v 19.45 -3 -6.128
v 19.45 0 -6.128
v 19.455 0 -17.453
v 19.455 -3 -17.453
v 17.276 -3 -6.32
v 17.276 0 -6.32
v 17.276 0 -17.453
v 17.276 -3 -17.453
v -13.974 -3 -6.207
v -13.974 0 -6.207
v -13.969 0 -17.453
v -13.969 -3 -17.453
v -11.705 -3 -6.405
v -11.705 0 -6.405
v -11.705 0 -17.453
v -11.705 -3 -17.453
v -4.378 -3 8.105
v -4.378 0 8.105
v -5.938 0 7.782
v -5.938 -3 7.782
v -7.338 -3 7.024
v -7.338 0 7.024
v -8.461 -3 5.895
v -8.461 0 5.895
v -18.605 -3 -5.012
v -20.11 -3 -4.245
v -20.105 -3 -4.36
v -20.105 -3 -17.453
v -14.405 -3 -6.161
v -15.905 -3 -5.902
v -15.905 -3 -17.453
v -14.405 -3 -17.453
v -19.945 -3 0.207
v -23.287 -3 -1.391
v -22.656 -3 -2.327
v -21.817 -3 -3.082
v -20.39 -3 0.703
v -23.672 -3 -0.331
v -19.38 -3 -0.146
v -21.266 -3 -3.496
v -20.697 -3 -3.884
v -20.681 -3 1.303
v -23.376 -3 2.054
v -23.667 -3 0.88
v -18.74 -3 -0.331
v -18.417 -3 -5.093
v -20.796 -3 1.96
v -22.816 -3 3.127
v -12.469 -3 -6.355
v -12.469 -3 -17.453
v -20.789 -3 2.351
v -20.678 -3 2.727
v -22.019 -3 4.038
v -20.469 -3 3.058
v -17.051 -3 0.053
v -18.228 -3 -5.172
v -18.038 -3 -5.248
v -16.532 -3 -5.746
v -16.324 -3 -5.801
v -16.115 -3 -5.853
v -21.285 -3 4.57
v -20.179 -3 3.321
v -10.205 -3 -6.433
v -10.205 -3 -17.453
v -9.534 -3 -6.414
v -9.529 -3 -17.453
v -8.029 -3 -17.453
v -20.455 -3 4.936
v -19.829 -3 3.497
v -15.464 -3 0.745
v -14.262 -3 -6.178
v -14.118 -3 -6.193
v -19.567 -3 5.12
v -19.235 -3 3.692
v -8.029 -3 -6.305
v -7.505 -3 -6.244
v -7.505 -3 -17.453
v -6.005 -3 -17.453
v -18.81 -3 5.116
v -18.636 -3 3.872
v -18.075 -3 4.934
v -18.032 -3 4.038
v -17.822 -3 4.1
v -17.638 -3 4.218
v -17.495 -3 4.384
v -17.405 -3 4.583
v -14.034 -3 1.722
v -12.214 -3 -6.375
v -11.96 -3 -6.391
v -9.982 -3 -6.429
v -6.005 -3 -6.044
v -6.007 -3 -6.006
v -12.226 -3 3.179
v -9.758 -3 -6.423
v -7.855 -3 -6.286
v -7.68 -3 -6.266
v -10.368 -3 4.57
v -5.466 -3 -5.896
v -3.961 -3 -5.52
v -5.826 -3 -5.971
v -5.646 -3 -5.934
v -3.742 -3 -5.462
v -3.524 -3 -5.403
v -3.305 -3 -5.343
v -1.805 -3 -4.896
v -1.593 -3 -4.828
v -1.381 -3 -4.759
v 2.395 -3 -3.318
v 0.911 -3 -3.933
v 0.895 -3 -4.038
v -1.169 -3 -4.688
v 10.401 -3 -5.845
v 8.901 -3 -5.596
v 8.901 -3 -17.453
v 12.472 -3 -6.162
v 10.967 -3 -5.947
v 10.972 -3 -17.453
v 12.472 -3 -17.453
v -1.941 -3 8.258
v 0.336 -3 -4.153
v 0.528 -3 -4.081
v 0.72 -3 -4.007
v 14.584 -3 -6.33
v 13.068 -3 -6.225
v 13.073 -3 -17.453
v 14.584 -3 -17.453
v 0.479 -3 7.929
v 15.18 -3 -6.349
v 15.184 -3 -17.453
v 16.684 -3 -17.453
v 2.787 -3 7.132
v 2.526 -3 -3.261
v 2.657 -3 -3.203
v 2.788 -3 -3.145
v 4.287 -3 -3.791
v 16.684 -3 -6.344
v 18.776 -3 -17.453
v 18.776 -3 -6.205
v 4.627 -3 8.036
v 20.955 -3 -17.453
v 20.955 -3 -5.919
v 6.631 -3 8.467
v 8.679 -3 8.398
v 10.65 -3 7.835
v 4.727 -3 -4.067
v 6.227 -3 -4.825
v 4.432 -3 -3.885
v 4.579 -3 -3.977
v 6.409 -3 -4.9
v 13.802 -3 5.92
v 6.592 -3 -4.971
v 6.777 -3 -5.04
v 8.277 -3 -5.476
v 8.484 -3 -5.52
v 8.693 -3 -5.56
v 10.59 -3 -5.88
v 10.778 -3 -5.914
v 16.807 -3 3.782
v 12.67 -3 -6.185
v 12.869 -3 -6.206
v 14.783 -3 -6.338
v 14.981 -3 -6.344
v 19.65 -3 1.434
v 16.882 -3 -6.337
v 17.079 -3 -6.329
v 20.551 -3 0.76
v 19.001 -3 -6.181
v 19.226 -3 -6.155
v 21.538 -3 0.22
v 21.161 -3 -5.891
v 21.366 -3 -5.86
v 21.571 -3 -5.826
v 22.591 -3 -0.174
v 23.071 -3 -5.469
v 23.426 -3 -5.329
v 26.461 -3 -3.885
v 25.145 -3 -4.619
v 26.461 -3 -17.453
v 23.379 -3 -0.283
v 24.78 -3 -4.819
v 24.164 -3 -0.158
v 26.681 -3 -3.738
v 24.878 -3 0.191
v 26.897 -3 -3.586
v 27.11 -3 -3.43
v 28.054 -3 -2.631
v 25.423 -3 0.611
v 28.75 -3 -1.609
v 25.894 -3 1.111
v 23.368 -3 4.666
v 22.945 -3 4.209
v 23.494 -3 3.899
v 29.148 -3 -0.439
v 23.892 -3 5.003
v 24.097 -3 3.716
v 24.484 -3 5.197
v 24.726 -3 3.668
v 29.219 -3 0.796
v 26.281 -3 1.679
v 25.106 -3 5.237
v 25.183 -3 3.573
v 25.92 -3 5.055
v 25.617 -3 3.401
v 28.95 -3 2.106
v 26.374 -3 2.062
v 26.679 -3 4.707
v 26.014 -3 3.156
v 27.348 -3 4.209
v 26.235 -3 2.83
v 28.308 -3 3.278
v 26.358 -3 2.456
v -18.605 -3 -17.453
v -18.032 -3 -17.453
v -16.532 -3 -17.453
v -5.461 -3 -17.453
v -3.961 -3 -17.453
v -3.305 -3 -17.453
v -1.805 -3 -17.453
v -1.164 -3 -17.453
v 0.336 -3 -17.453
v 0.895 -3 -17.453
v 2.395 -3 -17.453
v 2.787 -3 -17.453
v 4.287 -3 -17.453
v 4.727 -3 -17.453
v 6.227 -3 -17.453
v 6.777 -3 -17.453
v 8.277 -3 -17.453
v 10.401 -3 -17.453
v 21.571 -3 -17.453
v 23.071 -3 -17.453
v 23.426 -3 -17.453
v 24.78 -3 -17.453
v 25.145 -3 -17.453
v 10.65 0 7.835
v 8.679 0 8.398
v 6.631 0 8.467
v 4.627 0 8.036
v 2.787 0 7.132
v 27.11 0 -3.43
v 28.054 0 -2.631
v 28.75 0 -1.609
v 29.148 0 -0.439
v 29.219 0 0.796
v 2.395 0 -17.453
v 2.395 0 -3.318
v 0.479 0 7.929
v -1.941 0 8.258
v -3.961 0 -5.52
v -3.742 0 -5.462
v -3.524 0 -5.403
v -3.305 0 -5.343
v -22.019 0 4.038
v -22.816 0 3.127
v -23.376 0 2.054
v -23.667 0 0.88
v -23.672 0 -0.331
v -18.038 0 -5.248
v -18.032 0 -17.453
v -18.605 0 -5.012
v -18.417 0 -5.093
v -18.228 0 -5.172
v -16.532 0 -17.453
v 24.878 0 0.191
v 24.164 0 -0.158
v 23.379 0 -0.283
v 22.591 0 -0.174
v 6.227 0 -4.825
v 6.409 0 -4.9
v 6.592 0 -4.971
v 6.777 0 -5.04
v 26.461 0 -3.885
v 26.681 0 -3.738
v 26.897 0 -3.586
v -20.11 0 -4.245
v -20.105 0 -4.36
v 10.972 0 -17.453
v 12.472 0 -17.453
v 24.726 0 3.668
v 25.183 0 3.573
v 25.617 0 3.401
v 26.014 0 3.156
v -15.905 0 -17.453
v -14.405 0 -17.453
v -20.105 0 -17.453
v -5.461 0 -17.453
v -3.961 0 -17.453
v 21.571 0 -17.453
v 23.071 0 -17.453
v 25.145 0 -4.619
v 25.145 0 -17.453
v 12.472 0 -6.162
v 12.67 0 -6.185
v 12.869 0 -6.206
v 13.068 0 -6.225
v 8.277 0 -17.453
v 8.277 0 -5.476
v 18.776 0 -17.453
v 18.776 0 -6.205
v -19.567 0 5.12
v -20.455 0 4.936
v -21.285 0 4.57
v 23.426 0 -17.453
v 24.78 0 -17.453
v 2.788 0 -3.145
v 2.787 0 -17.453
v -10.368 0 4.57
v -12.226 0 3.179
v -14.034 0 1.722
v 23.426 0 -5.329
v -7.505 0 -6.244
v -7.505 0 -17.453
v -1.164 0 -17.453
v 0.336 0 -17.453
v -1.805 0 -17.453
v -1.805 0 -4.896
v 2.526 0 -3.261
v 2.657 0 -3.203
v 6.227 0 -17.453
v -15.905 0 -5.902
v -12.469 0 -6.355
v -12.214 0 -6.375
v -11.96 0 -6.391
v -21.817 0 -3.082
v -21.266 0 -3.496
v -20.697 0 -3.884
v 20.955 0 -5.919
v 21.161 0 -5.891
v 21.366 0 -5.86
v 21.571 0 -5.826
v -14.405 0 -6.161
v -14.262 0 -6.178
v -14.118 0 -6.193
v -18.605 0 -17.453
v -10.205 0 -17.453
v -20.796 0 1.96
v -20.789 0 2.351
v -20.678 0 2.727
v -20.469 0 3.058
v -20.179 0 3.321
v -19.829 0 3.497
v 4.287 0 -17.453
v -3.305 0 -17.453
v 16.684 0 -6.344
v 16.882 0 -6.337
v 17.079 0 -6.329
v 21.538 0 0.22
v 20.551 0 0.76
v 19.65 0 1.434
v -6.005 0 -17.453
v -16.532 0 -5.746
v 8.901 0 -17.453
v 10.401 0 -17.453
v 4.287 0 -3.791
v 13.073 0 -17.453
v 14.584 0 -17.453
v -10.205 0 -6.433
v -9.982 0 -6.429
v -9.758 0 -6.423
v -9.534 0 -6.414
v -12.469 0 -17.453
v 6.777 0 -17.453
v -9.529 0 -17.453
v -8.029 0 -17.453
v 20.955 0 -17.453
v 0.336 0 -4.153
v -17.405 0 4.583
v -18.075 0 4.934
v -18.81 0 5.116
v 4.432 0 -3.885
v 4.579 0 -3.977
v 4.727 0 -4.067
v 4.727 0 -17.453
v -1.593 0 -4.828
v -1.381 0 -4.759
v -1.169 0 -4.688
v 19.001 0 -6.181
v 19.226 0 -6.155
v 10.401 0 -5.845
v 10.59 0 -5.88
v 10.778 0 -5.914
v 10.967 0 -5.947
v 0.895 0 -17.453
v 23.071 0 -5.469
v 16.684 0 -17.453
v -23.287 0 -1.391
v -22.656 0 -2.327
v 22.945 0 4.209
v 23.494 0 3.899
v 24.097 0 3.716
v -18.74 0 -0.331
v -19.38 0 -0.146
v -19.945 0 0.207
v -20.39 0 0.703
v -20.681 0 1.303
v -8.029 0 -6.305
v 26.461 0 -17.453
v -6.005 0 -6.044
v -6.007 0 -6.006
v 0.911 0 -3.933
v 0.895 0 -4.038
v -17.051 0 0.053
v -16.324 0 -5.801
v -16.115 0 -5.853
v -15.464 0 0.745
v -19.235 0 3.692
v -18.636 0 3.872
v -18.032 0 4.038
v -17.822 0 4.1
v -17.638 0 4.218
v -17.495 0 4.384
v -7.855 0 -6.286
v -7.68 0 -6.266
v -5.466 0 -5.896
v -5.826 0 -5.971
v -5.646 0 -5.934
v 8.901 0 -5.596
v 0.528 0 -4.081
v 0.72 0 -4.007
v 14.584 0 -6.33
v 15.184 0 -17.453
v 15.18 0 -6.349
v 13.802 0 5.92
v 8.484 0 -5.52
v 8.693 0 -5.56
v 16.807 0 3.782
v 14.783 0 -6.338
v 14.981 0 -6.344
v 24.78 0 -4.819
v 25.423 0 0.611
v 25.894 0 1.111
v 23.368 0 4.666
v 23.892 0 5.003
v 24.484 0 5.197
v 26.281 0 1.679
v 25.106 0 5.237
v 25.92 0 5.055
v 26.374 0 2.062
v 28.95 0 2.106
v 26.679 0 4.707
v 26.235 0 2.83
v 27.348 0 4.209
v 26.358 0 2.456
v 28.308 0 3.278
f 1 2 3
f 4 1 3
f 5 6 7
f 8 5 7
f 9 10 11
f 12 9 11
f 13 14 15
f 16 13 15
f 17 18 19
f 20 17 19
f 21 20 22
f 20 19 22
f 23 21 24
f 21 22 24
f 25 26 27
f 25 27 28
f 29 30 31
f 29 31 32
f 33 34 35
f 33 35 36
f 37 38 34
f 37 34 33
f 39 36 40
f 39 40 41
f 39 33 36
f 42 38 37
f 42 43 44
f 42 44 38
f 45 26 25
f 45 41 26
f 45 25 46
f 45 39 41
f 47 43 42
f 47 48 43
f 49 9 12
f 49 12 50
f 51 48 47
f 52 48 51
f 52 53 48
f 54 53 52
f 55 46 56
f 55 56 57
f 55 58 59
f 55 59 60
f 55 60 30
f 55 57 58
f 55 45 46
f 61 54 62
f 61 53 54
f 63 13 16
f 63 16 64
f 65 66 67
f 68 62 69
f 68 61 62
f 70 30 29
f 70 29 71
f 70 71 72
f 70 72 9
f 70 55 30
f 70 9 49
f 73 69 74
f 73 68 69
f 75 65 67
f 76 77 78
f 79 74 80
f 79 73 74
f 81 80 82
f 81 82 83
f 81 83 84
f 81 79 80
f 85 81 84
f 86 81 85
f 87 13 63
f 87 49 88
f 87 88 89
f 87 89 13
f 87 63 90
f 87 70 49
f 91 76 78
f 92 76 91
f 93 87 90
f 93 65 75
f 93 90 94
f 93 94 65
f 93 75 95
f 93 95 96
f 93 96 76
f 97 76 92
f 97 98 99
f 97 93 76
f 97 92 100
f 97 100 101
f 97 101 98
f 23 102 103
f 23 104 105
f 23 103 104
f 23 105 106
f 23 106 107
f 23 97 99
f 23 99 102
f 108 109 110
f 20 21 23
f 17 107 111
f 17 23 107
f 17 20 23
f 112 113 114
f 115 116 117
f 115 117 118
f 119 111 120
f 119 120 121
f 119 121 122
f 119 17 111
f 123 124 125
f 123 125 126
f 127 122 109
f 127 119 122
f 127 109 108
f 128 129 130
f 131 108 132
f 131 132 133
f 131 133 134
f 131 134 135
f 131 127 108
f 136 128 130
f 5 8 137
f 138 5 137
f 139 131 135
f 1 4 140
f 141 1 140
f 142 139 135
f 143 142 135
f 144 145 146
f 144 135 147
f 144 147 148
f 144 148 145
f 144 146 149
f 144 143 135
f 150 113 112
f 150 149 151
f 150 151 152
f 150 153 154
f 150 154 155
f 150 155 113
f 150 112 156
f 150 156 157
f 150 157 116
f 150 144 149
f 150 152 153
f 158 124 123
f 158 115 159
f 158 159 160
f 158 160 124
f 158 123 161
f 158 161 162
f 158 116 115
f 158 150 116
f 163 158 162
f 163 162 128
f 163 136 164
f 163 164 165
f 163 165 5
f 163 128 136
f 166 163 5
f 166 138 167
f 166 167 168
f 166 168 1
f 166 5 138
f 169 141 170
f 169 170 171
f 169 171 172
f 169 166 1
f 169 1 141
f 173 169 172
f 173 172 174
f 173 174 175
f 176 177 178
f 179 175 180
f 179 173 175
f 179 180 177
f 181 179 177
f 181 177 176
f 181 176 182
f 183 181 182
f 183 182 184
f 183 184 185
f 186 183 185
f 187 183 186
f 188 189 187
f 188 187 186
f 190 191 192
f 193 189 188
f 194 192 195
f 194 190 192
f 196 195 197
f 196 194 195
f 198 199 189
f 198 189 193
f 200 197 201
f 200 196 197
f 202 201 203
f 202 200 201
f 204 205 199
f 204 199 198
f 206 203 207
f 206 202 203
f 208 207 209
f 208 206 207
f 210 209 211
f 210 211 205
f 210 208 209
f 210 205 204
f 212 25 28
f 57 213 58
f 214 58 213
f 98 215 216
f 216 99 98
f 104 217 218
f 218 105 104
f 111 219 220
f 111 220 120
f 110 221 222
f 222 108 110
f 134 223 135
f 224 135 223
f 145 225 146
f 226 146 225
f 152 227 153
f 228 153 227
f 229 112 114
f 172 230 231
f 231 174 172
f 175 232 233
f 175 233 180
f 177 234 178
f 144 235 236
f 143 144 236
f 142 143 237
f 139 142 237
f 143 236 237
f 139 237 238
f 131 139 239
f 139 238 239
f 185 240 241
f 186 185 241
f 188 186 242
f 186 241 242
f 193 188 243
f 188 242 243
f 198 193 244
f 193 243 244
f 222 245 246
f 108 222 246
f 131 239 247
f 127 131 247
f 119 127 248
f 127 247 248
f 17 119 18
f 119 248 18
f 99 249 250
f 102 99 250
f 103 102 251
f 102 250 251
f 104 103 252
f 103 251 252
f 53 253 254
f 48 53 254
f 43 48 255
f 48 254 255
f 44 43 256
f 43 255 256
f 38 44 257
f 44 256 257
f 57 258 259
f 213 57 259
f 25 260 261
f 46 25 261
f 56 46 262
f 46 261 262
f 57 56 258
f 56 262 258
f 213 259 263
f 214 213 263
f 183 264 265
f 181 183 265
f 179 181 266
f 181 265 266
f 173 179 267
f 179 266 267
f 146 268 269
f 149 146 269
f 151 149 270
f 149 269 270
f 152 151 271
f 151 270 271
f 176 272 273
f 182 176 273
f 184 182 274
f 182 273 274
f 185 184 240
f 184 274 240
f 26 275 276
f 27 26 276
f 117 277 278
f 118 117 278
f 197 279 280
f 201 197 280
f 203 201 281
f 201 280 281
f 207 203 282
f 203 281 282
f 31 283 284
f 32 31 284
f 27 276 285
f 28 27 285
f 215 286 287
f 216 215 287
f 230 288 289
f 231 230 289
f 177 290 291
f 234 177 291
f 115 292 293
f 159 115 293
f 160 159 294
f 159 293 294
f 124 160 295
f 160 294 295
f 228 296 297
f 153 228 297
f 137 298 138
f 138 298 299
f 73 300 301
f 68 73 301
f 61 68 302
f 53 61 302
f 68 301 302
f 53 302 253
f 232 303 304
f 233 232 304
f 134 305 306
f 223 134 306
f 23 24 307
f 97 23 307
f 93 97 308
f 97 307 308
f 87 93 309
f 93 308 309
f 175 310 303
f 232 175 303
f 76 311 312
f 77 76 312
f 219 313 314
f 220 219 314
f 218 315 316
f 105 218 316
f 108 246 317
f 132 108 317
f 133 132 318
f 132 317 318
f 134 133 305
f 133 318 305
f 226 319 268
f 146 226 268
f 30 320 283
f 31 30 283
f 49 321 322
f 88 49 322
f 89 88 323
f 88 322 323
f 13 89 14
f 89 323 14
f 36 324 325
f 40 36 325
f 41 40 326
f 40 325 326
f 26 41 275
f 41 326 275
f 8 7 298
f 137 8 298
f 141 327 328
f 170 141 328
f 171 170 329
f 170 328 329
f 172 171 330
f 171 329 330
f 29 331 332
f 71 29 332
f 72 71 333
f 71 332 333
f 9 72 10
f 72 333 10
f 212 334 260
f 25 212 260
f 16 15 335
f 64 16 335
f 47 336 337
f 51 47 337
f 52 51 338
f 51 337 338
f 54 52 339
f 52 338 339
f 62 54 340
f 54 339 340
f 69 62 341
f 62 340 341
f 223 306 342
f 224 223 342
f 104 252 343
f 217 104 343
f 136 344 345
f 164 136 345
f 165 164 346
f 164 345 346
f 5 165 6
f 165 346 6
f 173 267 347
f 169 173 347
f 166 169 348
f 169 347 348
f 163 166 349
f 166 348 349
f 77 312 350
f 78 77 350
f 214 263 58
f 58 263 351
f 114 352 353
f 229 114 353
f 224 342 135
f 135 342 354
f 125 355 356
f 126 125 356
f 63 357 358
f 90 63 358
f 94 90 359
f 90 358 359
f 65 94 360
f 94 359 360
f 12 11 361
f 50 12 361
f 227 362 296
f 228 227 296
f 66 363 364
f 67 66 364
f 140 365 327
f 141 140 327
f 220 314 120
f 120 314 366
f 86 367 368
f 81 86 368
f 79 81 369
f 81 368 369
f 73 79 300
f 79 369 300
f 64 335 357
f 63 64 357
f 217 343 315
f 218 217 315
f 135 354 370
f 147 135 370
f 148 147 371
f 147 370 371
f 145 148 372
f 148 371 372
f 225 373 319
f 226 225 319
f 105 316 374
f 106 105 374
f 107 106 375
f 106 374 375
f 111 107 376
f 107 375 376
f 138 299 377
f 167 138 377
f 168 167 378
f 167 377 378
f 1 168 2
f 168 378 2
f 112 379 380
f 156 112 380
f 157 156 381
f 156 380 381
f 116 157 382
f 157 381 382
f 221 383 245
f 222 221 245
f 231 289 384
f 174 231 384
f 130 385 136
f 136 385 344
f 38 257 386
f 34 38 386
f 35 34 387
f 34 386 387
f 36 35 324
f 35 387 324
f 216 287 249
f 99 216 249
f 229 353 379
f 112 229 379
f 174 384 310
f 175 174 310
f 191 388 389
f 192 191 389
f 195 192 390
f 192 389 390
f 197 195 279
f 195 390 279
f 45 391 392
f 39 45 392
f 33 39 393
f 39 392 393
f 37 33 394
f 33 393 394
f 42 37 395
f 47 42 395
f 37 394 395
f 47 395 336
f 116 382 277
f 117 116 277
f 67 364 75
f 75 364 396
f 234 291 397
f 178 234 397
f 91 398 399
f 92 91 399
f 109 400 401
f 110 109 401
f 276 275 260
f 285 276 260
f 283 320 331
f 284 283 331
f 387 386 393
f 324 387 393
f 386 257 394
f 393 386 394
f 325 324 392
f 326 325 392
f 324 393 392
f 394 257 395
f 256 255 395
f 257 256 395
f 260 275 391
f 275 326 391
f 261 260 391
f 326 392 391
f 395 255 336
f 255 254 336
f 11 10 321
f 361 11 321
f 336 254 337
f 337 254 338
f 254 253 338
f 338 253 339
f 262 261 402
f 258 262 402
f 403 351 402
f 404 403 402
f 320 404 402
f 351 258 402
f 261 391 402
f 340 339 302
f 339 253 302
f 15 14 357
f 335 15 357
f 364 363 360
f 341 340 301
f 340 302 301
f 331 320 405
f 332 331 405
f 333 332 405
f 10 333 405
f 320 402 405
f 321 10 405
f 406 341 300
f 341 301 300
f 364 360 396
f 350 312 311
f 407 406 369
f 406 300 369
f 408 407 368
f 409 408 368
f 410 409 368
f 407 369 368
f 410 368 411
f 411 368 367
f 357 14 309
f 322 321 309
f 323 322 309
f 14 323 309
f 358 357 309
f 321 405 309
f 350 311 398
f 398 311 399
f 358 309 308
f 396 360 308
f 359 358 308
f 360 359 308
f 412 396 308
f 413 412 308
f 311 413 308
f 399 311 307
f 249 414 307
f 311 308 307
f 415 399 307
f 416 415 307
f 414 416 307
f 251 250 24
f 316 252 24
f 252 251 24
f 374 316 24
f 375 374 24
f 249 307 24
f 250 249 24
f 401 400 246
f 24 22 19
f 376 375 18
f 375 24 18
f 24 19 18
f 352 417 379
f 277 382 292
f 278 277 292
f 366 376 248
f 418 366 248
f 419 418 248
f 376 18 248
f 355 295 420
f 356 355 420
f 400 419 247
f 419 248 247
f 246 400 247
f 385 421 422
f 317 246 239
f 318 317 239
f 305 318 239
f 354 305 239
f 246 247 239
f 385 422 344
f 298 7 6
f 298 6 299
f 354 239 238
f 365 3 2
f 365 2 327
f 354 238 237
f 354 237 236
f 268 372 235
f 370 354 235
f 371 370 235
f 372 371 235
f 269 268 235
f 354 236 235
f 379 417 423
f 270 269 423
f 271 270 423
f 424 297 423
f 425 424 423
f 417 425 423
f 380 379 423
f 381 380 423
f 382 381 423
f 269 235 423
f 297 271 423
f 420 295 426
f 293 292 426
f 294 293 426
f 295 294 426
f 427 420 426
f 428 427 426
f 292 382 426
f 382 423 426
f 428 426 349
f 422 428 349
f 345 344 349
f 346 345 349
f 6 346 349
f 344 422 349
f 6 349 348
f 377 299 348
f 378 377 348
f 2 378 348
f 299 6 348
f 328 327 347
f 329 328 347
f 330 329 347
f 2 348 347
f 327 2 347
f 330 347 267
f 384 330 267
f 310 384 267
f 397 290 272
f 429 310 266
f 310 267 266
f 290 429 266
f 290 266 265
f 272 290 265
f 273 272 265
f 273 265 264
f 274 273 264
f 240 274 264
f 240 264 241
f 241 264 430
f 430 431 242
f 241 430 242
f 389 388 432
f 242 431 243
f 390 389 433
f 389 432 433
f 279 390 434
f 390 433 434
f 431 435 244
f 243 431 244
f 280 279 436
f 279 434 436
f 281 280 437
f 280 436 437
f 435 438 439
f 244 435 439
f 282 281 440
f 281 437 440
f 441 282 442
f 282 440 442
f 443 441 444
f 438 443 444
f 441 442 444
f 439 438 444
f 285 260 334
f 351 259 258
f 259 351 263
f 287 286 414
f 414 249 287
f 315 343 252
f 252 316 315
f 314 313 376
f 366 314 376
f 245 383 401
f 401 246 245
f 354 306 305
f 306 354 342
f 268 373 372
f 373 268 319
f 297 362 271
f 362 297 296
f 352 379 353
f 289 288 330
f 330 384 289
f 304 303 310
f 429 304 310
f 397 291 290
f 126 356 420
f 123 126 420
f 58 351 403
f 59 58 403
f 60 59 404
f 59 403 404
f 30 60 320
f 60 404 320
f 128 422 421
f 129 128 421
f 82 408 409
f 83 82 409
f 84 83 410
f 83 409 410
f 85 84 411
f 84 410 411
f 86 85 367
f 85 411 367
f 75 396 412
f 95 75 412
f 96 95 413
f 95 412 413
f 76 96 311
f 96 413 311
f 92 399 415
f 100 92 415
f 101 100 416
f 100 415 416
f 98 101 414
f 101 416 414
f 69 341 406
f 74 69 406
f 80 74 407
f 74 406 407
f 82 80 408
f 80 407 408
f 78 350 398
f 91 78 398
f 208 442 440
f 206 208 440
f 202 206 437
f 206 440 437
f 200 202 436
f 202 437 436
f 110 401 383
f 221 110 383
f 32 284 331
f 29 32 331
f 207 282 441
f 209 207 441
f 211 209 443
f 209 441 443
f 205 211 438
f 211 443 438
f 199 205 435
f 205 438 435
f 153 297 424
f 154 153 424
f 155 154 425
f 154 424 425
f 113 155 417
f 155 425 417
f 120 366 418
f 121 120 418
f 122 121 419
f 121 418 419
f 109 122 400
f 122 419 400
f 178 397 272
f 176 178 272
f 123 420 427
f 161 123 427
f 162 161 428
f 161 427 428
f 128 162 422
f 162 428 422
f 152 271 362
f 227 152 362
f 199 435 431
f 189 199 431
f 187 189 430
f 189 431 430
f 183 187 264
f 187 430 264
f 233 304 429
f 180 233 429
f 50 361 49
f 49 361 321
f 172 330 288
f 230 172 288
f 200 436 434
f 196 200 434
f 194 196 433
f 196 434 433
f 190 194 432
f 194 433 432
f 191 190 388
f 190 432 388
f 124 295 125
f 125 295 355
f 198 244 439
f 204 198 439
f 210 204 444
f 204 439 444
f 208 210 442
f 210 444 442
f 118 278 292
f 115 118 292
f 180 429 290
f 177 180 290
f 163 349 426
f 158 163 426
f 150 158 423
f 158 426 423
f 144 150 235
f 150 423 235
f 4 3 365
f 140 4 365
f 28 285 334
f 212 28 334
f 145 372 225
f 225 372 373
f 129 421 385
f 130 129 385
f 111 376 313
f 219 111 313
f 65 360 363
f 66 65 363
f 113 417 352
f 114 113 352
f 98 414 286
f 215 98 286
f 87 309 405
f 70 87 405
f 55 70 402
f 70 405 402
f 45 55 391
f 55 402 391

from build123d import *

# Parameters (mm, degrees)
F1_DEPTH = 3


with BuildPart() as f1:
    # F0 (on Front) → F1 (new body)
    with BuildSketch(Plane.XZ):
        with BuildLine():
            ThreePointArc((19.64988, 1.433678), (15.323457, 4.878104), (10.650251, 7.834987))
            ThreePointArc((10.650251, 7.834987), (6.630714, 8.466829), (2.786874, 7.132363))
            ThreePointArc((2.786874, 7.132363), (-0.723137, 8.153352), (-4.378306, 8.104974))
            ThreePointArc((-4.378306, 8.104974), (-6.665865, 7.454354), (-8.461449, 5.894833))
            ThreePointArc((-8.461449, 5.894833), (-11.303445, 3.882664), (-14.034172, 1.7219))
            ThreePointArc((-14.034172, 1.7219), (-16.241362, 0.362004), (-18.739592, -0.33071))
            ThreePointArc((-18.739592, -0.33071), (-20.184903, 0.439819), (-20.795666, 1.959558))
            ThreePointArc((-20.795666, 1.959558), (-20.5849, 2.899405), (-19.829269, 3.496695))
            ThreePointArc((-19.829269, 3.496695), (-18.935867, 3.784112), (-18.032324, 4.037856))
            ThreePointArc((-18.032324, 4.037856), (-17.638426, 4.218128), (-17.404594, 4.582786))
            ThreePointArc((-17.404594, 4.582786), (-18.437288, 5.04708), (-19.567223, 5.119697))
            ThreePointArc((-19.567223, 5.119697), (-20.879767, 4.775386), (-22.018788, 4.037856))
            ThreePointArc((-22.018788, 4.037856), (-23.375832, 2.054301), (-23.672102, -0.33071))
            ThreePointArc((-23.672102, -0.33071), (-23.000152, -1.878598), (-21.816935, -3.081708))
            ThreePointArc((-21.816935, -3.081708), (-20.983966, -3.693037), (-20.110425, -4.244841))
            Line((-20.110425, -4.244841), (-20.10519, -4.36016))
            Line((-20.10519, -4.36016), (-20.10519, -17.453194))
            Line((-20.10519, -17.453194), (-18.60519, -17.453194))
            Line((-18.60519, -17.453194), (-18.60519, -5.012271))
            ThreePointArc((-18.60519, -5.012271), (-18.322698, -5.133071), (-18.037762, -5.247988))
            Line((-18.037762, -5.247988), (-18.032324, -17.453194))
            Line((-18.032324, -17.453194), (-16.532324, -17.453194))
            Line((-16.532324, -17.453194), (-16.532324, -5.745979))
            ThreePointArc((-16.532324, -5.745979), (-16.219609, -5.827508), (-15.90519, -5.902199))
            Line((-15.90519, -5.902199), (-15.90519, -17.453194))
            Line((-15.90519, -17.453194), (-14.40519, -17.453194))
            Line((-14.40519, -17.453194), (-14.40519, -6.161144))
            ThreePointArc((-14.40519, -6.161144), (-14.189632, -6.185442), (-13.973741, -6.206582))
            Line((-13.973741, -6.206582), (-13.968729, -17.453194))
            Line((-13.968729, -17.453194), (-12.468729, -17.453194))
            Line((-12.468729, -17.453194), (-12.468729, -6.355174))
            ThreePointArc((-12.468729, -6.355174), (-12.08716, -6.383263), (-11.70519, -6.405258))
            Line((-11.70519, -6.405258), (-11.70519, -17.453194))
            Line((-11.70519, -17.453194), (-10.20519, -17.453194))
            Line((-10.20519, -17.453194), (-10.20519, -6.432613))
            ThreePointArc((-10.20519, -6.432613), (-9.869726, -6.425881), (-9.53439, -6.414452))
            Line((-9.53439, -6.414452), (-9.52947, -17.453194))
            Line((-9.52947, -17.453194), (-8.02947, -17.453194))
            Line((-8.02947, -17.453194), (-8.02947, -6.305079))
            ThreePointArc((-8.02947, -6.305079), (-7.767164, -6.276231), (-7.50519, -6.244497))
            Line((-7.50519, -6.244497), (-7.50519, -17.453194))
            Line((-7.50519, -17.453194), (-6.00519, -17.453194))
            Line((-6.00519, -17.453194), (-6.00519, -6.044151))
            Line((-6.00519, -6.044151), (-6.006557, -6.006161))
            ThreePointArc((-6.006557, -6.006161), (-5.736134, -5.952714), (-5.466344, -5.89616))
            Line((-5.466344, -5.89616), (-5.461194, -17.453194))
            Line((-5.461194, -17.453194), (-3.961194, -17.453194))
            Line((-3.961194, -17.453194), (-3.961194, -5.52024))
            ThreePointArc((-3.961194, -5.52024), (-3.632846, -5.432887), (-3.30519, -5.342972))
            Line((-3.30519, -5.342972), (-3.30519, -17.453194))
            Line((-3.30519, -17.453194), (-1.80519, -17.453194))
            Line((-1.80519, -17.453194), (-1.80519, -4.895811))
            ThreePointArc((-1.80519, -4.895811), (-1.486897, -4.793308), (-1.169401, -4.688361))
            Line((-1.169401, -4.688361), (-1.163963, -17.453194))
            Line((-1.163963, -17.453194), (0.336037, -17.453194))
            Line((0.336037, -17.453194), (0.336037, -4.153387))
            ThreePointArc((0.336037, -4.153387), (0.623788, -4.043977), (0.910758, -3.932534))
            Line((0.910758, -3.932534), (0.89481, -4.038423))
            Line((0.89481, -4.038423), (0.89481, -17.453194))
            Line((0.89481, -17.453194), (2.39481, -17.453194))
            Line((2.39481, -17.453194), (2.39481, -3.318312))
            ThreePointArc((2.39481, -3.318312), (2.591489, -3.232046), (2.78774, -3.14481))
            Line((2.78774, -3.14481), (2.786874, -17.453194))
            Line((2.786874, -17.453194), (4.286874, -17.453194))
            Line((4.286874, -17.453194), (4.286874, -3.791388))
            ThreePointArc((4.286874, -3.791388), (4.50534, -3.931658), (4.726803, -4.067149))
            Line((4.726803, -4.067149), (4.726803, -17.453194))
            Line((4.726803, -17.453194), (6.226803, -17.453194))
            Line((6.226803, -17.453194), (6.226803, -4.824973))
            ThreePointArc((6.226803, -4.824973), (6.500619, -4.935953), (6.777095, -5.040129))
            Line((6.777095, -5.040129), (6.777095, -17.453194))
            Line((6.777095, -17.453194), (8.277095, -17.453194))
            Line((8.277095, -17.453194), (8.277095, -5.475662))
            ThreePointArc((8.277095, -5.475662), (8.588473, -5.54004), (8.901453, -5.596111))
            Line((8.901453, -5.596111), (8.901453, -17.453194))
            Line((8.901453, -17.453194), (10.401453, -17.453194))
            Line((10.401453, -17.453194), (10.401453, -5.844886))
            ThreePointArc((10.401453, -5.844886), (10.683933, -5.897254), (10.96692, -5.946817))
            Line((10.96692, -5.946817), (10.972047, -17.453194))
            Line((10.972047, -17.453194), (12.472047, -17.453194))
            Line((12.472047, -17.453194), (12.472047, -6.162236))
            ThreePointArc((12.472047, -6.162236), (12.769688, -6.195327), (13.067656, -6.225338))
            Line((13.067656, -6.225338), (13.073482, -17.453194))
            Line((13.073482, -17.453194), (14.584494, -17.453194))
            Line((14.584494, -17.453194), (14.584494, -6.330084))
            ThreePointArc((14.584494, -6.330084), (14.88197, -6.341257), (15.179546, -6.349371))
            Line((15.179546, -6.349371), (15.184494, -17.453194))
            Line((15.184494, -17.453194), (16.684494, -17.453194))
            Line((16.684494, -17.453194), (16.684494, -6.343539))
            ThreePointArc((16.684494, -6.343539), (16.980227, -6.33319), (17.27584, -6.319818))
            Line((17.27584, -6.319818), (17.27584, -6.356424))
            Line((17.27584, -6.356424), (17.27584, -17.453194))
            Line((17.27584, -17.453194), (18.77584, -17.453194))
            Line((18.77584, -17.453194), (18.77584, -6.205151))
            ThreePointArc((18.77584, -6.205151), (19.113283, -6.168516), (19.450272, -6.127927))
            Line((19.450272, -6.127927), (19.455319, -17.453194))
            Line((19.455319, -17.453194), (20.955319, -17.453194))
            Line((20.955319, -17.453194), (20.955319, -5.91936))
            ThreePointArc((20.955319, -5.91936), (21.263829, -5.876265), (21.571221, -5.82581))
            Line((21.571221, -5.82581), (21.571221, -17.453194))
            Line((21.571221, -17.453194), (23.071221, -17.453194))
            Line((23.071221, -17.453194), (23.071221, -5.468547))
            Line((23.071221, -5.468547), (23.425881, -5.329391))
            Line((23.425881, -5.329391), (23.425881, -17.453194))
            Line((23.425881, -17.453194), (24.779715, -17.453194))
            Line((24.779715, -17.453194), (24.779715, -4.81928))
            Line((24.779715, -4.81928), (25.144875, -4.61932))
            Line((25.144875, -4.61932), (25.144875, -17.453194))
            Line((25.144875, -17.453194), (26.461203, -17.453194))
            Line((26.461203, -17.453194), (26.461203, -4.36016))
            Line((26.461203, -4.36016), (26.461203, -3.884922))
            ThreePointArc((26.461203, -3.884922), (26.789065, -3.662423), (27.110012, -3.430062))
            ThreePointArc((27.110012, -3.430062), (28.749864, -1.609204), (29.219028, 0.7959))
            ThreePointArc((29.219028, 0.7959), (28.672922, 2.715777), (27.348137, 4.208795))
            ThreePointArc((27.348137, 4.208795), (26.308789, 4.900953), (25.106104, 5.236921))
            ThreePointArc((25.106104, 5.236921), (23.892424, 5.002762), (22.945076, 4.208795))
            ThreePointArc((22.945076, 4.208795), (23.790754, 3.790745), (24.726035, 3.667505))
            ThreePointArc((24.726035, 3.667505), (25.403757, 3.496758), (26.01371, 3.155556))
            ThreePointArc((26.01371, 3.155556), (26.358297, 2.455561), (26.280997, 1.679185))
            ThreePointArc((26.280997, 1.679185), (25.668609, 0.851297), (24.878269, 0.19116))
            ThreePointArc((24.878269, 0.19116), (23.775899, -0.249398), (22.591121, -0.174478))
            ThreePointArc((22.591121, -0.174478), (21.034715, 0.472702), (19.64988, 1.433678))
        make_face()
    extrude(amount=F1_DEPTH)


solid = f1.part
